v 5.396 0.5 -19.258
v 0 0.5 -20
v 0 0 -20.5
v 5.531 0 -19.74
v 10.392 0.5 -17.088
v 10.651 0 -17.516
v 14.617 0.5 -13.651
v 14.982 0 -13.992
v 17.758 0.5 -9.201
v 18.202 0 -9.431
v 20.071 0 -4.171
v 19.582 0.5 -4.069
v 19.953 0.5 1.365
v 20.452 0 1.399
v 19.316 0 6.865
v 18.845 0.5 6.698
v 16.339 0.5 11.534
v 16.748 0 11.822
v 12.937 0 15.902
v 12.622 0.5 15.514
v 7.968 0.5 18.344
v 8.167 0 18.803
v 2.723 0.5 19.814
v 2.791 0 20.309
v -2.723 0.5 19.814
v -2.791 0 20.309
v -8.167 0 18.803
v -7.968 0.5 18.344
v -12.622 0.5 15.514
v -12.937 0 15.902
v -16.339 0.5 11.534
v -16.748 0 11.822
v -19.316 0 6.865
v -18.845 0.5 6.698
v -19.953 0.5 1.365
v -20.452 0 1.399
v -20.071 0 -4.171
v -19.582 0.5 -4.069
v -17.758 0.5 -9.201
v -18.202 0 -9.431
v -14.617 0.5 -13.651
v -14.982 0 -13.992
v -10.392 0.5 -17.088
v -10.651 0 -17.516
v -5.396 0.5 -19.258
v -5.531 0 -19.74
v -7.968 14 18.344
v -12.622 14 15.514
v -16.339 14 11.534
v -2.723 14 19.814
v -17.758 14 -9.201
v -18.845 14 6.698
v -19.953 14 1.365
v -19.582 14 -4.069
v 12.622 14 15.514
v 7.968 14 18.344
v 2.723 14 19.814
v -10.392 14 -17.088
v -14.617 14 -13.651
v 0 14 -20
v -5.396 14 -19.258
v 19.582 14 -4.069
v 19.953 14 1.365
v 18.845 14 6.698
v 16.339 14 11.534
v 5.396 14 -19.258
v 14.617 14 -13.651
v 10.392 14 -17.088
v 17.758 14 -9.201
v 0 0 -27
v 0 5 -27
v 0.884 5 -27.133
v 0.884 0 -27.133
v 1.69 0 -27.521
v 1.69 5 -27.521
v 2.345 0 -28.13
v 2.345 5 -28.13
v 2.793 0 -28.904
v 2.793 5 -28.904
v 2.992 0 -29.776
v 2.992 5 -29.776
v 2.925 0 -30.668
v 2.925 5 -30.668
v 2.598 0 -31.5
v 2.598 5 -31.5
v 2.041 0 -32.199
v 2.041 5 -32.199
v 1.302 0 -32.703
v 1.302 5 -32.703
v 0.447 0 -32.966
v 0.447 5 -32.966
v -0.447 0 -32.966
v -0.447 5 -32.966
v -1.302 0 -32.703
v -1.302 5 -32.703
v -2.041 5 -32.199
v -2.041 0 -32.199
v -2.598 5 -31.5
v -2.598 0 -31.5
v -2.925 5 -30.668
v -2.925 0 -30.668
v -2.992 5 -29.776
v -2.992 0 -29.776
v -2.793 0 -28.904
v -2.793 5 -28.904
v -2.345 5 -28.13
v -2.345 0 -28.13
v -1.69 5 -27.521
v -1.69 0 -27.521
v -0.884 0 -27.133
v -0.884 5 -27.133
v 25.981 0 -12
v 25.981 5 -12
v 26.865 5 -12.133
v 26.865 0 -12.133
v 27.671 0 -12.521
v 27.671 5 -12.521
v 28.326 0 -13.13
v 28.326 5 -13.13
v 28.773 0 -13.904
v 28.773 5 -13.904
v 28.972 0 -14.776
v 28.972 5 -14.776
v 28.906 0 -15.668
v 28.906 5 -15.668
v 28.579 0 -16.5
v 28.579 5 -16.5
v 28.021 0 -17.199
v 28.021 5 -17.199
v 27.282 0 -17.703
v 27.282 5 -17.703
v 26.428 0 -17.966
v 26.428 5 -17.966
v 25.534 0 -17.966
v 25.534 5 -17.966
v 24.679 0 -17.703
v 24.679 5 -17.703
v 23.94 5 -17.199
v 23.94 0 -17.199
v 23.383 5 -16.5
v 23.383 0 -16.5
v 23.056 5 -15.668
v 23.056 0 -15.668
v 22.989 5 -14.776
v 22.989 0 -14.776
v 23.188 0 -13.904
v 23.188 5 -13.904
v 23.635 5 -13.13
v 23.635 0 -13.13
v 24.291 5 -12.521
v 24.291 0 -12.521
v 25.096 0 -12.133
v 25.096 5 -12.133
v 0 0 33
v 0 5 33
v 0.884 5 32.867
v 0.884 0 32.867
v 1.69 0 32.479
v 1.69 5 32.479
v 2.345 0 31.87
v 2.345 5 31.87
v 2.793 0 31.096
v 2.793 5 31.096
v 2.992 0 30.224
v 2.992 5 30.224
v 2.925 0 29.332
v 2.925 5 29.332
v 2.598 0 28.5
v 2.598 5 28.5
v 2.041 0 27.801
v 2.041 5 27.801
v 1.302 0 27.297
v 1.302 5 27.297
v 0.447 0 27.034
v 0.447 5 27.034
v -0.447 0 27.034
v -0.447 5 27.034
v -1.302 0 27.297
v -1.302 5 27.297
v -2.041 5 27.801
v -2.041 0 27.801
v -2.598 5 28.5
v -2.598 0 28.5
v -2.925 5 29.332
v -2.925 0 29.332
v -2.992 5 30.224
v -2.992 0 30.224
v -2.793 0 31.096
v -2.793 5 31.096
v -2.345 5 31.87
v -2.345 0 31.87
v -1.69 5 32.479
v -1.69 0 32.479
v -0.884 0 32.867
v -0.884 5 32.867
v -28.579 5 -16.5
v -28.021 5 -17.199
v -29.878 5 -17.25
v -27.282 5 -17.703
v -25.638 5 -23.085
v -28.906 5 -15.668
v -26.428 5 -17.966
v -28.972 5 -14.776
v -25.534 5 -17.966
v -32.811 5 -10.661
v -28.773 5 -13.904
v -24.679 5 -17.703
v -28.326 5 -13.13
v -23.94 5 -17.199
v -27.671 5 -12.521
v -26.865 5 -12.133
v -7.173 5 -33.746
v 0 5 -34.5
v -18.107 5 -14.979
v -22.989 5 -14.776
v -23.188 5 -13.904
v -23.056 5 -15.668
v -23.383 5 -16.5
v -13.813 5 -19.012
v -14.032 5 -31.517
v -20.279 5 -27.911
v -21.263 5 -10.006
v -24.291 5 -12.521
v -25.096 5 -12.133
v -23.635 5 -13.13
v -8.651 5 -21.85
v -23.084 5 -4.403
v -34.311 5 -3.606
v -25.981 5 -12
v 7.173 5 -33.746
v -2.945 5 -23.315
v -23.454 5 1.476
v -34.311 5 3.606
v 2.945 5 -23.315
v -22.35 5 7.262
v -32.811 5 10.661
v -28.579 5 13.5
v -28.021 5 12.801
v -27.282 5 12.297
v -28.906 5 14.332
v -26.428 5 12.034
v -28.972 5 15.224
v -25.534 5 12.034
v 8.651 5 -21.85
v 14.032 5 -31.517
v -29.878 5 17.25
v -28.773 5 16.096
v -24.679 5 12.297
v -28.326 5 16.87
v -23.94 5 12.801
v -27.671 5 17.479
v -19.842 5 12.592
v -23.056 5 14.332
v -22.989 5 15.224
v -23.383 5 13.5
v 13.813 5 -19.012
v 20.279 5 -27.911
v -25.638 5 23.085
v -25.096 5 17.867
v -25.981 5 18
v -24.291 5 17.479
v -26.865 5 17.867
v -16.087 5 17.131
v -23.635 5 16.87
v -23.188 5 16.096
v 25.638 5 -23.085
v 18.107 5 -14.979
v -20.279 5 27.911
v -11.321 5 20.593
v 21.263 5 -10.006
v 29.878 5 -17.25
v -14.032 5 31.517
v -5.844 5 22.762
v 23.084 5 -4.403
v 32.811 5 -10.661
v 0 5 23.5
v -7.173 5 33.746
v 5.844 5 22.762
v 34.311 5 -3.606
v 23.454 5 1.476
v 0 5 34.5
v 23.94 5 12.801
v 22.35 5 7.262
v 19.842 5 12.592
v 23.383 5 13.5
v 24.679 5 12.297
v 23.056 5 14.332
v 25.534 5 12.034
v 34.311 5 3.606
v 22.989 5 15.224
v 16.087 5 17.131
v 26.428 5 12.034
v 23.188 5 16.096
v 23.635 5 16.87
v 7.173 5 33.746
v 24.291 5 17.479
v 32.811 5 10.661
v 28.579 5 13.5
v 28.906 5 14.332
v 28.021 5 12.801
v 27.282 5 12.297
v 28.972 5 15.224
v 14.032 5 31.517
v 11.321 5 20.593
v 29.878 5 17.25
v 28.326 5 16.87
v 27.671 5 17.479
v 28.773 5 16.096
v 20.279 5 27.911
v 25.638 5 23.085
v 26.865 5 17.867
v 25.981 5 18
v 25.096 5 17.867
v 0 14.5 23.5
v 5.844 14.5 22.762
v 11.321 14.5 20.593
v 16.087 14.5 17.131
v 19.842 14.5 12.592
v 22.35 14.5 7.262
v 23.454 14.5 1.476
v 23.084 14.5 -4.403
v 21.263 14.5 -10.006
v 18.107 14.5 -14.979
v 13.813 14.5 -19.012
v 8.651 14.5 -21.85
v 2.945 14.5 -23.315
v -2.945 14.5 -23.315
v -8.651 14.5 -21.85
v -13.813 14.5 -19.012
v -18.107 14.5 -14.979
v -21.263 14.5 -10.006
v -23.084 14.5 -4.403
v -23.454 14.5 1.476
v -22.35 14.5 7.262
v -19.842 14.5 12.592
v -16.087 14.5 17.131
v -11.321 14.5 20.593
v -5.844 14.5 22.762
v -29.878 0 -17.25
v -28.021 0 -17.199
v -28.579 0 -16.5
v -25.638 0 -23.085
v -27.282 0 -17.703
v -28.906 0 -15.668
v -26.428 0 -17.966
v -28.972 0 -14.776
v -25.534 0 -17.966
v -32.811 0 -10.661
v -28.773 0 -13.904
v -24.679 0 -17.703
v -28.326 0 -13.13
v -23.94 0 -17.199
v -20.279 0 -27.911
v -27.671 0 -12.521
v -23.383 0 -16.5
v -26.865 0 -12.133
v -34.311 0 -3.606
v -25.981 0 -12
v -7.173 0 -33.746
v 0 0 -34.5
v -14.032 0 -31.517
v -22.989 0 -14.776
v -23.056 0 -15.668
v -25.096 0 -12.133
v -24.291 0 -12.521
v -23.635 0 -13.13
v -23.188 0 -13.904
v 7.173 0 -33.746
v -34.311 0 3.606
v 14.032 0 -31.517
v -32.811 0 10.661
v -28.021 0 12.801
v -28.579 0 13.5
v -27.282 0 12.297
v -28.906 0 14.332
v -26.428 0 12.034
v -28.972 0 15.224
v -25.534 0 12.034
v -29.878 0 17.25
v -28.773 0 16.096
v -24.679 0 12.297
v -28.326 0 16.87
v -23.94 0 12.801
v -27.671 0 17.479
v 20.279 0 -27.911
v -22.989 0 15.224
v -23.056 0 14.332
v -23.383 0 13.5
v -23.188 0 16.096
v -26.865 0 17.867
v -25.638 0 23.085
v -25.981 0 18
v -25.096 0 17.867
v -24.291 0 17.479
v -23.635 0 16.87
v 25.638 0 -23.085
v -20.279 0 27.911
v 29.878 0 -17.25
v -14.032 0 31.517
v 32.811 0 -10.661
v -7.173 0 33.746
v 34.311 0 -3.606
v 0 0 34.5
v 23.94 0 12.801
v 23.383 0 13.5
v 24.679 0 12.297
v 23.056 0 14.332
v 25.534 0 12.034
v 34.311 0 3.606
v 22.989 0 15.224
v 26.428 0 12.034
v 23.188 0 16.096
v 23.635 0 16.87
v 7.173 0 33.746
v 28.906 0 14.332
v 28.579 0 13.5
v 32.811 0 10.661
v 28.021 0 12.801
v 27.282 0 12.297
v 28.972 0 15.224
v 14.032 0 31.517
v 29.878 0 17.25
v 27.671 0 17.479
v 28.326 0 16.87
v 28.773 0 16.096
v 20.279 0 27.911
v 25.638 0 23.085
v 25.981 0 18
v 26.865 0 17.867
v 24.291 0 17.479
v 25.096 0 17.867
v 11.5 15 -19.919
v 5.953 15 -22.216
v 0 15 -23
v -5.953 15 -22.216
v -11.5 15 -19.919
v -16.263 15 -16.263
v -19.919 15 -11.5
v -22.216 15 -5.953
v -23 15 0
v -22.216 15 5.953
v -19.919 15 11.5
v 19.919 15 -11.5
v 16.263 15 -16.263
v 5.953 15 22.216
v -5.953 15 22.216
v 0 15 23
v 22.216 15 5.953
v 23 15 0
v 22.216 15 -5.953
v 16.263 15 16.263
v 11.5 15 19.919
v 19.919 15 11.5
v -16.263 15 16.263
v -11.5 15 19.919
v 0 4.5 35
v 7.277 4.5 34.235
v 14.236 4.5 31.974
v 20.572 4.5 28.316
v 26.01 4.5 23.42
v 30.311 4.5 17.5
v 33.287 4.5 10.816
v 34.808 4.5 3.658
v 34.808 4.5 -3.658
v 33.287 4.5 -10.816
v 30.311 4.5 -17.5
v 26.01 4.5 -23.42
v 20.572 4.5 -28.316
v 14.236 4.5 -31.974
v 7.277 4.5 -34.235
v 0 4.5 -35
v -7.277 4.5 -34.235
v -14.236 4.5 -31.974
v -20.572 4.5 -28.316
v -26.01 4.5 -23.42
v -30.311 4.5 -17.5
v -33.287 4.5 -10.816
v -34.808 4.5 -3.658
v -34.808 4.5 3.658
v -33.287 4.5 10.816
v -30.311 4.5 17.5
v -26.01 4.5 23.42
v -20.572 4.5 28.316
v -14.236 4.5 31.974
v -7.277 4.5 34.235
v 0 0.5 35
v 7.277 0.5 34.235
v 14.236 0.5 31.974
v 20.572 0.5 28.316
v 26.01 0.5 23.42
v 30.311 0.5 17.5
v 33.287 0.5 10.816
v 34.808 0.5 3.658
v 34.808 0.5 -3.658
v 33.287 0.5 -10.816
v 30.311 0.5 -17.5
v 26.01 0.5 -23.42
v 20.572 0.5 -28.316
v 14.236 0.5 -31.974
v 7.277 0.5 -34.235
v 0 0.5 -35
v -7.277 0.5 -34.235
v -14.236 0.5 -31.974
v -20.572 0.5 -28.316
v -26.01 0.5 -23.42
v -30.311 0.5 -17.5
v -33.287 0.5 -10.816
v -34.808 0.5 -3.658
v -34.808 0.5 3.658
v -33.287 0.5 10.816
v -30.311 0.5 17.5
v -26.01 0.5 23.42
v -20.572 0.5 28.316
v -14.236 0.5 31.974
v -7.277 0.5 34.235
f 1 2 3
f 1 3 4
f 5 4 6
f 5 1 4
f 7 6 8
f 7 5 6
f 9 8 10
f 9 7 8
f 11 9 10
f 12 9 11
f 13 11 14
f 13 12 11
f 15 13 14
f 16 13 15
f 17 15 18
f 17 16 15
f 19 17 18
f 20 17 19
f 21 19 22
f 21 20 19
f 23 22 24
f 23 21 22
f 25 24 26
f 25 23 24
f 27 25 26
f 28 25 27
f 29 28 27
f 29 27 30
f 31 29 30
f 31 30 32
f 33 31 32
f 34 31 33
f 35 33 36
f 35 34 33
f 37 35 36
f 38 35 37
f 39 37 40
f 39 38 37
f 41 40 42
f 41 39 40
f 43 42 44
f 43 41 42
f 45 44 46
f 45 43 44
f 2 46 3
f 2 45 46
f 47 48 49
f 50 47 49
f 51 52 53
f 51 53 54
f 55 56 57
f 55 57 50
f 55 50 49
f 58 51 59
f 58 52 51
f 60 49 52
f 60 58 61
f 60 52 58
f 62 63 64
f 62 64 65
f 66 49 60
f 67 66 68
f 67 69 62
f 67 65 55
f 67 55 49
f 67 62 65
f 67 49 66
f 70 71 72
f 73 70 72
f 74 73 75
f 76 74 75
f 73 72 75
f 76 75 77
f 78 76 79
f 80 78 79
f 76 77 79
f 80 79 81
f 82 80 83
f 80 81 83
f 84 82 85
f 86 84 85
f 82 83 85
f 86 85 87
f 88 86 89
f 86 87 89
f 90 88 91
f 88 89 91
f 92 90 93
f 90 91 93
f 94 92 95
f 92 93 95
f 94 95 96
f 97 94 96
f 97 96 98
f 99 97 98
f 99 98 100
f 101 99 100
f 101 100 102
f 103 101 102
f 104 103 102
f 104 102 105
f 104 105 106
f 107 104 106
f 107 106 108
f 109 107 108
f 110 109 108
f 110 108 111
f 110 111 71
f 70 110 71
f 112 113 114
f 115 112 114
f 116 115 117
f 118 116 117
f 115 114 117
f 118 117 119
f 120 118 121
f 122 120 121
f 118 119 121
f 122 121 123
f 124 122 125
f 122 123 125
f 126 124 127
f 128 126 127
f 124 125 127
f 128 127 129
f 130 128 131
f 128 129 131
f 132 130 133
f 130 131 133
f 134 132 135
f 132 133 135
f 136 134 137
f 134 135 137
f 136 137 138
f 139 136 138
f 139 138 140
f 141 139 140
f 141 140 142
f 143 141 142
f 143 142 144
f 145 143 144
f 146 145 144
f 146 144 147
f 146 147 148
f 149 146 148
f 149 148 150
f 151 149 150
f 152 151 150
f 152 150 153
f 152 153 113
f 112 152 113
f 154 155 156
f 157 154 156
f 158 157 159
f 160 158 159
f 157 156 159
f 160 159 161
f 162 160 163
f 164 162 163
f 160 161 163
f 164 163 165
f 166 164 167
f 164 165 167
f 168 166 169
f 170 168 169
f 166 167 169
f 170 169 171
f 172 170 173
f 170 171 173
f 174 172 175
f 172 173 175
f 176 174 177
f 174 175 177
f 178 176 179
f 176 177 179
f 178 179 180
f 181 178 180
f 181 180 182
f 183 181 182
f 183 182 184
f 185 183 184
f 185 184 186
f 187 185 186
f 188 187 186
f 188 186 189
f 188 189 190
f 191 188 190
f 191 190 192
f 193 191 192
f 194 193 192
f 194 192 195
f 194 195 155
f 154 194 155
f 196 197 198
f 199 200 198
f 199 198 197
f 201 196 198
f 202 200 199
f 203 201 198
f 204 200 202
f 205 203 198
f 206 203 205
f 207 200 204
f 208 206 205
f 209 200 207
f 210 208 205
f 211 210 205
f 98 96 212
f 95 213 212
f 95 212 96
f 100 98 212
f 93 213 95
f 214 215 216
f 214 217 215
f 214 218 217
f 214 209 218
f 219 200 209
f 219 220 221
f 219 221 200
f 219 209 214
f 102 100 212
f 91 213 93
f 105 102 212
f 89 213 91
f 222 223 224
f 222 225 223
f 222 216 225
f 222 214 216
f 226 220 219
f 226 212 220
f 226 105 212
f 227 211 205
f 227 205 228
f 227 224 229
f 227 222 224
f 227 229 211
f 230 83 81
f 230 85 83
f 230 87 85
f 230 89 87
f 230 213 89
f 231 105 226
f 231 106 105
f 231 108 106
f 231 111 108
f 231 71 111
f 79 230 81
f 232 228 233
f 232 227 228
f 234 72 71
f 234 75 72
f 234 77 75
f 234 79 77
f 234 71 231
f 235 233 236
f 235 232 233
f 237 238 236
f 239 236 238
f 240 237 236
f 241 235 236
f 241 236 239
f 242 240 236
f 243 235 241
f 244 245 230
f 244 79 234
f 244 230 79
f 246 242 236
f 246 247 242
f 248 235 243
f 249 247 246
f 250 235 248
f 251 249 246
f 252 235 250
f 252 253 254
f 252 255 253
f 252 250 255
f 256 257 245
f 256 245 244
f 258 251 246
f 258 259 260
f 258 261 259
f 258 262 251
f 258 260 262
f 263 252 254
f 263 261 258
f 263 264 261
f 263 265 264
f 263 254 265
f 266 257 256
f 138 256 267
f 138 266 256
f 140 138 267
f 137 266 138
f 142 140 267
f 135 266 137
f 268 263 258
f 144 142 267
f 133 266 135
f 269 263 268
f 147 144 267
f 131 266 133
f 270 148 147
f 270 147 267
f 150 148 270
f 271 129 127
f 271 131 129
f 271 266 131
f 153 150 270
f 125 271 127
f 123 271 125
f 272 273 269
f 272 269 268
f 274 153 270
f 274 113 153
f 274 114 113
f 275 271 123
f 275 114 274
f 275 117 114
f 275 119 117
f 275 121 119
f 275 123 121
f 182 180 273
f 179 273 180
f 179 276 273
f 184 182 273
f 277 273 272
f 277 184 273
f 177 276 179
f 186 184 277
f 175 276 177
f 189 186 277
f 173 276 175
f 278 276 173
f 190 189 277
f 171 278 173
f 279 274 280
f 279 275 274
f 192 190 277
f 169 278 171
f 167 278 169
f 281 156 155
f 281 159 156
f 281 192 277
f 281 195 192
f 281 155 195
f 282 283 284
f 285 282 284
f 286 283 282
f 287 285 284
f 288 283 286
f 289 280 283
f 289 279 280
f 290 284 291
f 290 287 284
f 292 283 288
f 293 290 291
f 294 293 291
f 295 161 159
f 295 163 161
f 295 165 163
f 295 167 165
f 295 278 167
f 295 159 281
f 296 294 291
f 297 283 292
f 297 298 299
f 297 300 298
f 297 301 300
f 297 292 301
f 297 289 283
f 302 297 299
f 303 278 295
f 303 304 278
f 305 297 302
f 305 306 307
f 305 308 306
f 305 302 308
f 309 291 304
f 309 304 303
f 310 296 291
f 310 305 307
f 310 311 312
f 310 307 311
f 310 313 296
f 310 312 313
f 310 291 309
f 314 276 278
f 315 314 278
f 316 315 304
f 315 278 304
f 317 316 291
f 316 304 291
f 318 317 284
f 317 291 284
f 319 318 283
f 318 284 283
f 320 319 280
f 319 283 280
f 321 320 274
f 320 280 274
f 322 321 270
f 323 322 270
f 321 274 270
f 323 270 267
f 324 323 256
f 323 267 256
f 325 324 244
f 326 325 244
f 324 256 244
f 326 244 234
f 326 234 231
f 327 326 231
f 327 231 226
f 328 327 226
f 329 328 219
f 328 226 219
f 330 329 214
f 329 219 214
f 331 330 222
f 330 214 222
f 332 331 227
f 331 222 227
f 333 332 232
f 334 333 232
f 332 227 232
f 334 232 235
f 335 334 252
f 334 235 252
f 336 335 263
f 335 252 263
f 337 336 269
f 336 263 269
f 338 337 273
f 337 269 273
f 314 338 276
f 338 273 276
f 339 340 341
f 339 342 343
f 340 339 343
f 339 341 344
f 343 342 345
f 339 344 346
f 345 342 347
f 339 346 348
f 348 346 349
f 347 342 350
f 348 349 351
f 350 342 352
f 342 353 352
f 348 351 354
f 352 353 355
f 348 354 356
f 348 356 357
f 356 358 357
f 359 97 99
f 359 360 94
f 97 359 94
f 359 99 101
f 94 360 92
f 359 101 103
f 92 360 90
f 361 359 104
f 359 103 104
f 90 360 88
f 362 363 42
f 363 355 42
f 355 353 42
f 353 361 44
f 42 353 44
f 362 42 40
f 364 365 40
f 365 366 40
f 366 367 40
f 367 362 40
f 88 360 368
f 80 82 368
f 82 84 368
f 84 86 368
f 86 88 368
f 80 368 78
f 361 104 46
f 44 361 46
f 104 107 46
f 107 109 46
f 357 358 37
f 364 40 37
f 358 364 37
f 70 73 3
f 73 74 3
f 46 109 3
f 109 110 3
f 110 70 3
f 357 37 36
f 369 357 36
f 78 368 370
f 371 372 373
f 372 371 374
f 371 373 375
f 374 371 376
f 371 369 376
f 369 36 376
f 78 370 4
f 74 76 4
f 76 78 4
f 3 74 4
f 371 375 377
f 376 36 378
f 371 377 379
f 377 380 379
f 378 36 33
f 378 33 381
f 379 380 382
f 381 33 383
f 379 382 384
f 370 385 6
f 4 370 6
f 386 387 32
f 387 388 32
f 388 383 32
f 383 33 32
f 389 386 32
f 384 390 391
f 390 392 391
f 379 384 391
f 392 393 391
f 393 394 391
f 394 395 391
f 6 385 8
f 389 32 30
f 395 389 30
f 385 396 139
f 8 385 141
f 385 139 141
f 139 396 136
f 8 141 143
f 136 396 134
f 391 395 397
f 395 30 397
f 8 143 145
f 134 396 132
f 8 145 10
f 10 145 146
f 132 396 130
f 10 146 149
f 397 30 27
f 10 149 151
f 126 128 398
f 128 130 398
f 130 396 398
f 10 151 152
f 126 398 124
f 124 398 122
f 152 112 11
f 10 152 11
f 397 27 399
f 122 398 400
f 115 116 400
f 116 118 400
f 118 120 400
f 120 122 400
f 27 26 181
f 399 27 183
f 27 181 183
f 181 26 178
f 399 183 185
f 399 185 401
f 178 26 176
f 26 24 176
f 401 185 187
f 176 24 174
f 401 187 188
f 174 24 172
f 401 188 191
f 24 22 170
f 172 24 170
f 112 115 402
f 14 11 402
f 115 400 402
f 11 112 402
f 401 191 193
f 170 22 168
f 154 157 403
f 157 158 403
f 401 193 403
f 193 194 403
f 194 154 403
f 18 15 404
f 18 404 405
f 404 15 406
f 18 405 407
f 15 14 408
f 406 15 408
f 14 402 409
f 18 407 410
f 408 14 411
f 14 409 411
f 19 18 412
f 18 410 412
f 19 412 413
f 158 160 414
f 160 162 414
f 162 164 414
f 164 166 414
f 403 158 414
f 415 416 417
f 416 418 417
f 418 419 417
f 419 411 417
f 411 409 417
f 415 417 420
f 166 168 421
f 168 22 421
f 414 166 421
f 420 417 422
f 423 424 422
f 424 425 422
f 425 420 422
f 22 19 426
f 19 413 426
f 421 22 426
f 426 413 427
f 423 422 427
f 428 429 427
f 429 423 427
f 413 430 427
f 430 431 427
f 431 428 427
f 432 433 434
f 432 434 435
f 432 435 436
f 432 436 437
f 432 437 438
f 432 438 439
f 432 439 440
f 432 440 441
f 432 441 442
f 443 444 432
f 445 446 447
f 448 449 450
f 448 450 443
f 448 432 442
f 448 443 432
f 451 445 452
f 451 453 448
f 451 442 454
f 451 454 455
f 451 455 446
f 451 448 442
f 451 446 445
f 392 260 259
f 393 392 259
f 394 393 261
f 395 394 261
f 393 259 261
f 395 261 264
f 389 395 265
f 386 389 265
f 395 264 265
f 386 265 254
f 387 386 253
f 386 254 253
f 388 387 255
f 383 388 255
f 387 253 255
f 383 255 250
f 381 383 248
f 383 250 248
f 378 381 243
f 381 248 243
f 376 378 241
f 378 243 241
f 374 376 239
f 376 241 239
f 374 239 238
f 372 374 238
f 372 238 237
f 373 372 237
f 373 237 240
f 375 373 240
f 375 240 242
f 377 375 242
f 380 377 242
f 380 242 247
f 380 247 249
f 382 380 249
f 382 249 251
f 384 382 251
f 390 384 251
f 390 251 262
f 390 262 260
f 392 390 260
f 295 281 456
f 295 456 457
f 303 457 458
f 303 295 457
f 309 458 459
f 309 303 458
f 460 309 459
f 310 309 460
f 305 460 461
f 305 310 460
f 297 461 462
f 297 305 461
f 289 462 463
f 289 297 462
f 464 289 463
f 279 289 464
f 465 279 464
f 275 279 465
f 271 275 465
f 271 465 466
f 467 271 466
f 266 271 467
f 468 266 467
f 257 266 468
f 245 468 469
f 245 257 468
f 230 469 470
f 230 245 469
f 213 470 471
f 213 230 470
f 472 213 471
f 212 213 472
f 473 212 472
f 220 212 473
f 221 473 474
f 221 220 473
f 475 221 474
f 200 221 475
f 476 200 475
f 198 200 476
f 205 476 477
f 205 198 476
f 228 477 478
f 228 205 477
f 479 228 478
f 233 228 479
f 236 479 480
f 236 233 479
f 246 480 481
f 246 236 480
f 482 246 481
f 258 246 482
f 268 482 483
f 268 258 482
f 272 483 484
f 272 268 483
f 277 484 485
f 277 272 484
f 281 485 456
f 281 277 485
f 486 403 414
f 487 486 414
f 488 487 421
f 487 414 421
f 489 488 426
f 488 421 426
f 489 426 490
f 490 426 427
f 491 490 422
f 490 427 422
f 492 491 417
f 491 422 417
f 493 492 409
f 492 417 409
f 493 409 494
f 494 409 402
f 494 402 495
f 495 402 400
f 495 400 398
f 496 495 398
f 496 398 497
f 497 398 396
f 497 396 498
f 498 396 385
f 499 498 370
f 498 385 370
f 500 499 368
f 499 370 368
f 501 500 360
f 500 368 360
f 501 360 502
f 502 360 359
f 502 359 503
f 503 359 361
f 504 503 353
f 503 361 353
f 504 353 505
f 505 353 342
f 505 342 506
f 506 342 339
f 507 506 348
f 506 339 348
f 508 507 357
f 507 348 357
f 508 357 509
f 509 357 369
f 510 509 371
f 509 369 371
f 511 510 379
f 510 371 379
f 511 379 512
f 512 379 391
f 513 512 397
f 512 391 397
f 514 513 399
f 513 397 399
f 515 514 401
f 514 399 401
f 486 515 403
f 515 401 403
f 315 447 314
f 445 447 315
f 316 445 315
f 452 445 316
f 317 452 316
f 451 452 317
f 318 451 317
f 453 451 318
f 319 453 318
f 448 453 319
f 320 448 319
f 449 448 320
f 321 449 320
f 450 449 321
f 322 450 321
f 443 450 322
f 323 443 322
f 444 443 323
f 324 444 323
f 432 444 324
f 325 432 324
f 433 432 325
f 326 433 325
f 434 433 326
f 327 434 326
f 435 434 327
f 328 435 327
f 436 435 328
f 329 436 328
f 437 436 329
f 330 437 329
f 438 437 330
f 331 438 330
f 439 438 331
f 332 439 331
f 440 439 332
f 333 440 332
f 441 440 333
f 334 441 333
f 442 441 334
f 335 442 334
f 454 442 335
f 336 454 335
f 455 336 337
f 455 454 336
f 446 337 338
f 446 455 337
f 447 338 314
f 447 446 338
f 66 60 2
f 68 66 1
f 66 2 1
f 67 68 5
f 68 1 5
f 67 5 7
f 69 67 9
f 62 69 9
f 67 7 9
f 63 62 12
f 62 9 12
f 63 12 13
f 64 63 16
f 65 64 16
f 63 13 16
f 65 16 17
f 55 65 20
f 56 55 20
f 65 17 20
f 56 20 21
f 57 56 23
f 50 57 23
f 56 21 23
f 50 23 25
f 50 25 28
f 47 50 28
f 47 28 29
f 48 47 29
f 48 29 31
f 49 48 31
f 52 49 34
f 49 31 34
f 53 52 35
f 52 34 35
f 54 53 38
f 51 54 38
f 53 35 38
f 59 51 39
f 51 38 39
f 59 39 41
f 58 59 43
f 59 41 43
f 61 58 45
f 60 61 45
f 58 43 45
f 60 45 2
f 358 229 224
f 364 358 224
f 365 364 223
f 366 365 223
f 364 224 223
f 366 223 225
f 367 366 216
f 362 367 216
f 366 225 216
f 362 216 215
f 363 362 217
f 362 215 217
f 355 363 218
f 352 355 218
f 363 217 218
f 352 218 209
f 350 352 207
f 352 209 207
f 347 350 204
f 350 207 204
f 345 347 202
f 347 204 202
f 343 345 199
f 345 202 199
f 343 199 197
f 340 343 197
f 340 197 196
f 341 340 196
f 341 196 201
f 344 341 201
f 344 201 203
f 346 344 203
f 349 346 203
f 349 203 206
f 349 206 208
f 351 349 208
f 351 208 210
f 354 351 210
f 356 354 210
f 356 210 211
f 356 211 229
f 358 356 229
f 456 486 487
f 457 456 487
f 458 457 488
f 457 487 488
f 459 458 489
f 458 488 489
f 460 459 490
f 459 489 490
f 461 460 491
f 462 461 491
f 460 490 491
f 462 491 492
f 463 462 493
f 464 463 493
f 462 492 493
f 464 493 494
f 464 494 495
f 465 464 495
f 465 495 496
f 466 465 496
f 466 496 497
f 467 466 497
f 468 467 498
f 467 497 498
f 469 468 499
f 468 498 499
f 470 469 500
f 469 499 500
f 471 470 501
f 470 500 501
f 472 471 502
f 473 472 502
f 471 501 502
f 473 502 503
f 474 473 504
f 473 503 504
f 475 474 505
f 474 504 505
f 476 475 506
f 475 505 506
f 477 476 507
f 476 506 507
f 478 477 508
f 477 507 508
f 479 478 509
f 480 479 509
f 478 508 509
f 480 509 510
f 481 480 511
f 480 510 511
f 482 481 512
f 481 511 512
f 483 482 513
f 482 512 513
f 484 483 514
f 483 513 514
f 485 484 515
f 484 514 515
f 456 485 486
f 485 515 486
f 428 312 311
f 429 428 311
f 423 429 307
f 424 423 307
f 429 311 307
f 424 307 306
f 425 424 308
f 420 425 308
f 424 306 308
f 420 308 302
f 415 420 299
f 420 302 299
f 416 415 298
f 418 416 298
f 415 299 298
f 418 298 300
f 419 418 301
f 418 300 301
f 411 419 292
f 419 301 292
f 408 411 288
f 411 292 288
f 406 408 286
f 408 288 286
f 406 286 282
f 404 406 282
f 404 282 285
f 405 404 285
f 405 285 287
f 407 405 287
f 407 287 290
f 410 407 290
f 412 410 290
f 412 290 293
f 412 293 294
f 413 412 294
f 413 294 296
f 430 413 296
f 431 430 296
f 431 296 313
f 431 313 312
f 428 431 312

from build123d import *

# Parameters (mm, degrees)
SKETCH_1_R          = 35
EXTRUDE_1_DEPTH     = 5
SKETCH_2_R          = 23.5
EXTRUDE_2_DEPTH     = 10
SKETCH_3_R          = 20
CUT_EXTRUDE_1_DEPTH = 14
SKETCH_4_R          = 3
CUT_EXTRUDE_2_DEPTH = 14
CHAMFER_1_SIZE      = 0.5


with BuildPart() as part:
    # 草图1 → 凸台-拉伸1 (new body)
    with BuildSketch(Plane(origin=(0, 0, 0), x_dir=(1, 0, 0), z_dir=(0, 1, 0))):
        with Locations(Location((0, 0, 0), (0, 0, 270))):
            Circle(SKETCH_1_R)
    extrude(amount=EXTRUDE_1_DEPTH)

    # 草图2 → 凸台-拉伸2 (add)
    with BuildSketch(Plane(origin=(0, 5, 0), x_dir=(1, 0, 0), z_dir=(0, 1, 0))):
        with Locations(Location((0, 0, 0), (0, 0, 270))):
            Circle(SKETCH_2_R)
    extrude(amount=EXTRUDE_2_DEPTH)

    # 草图3 → 切除-拉伸1 (cut)
    with BuildSketch(Plane.XZ):
        with Locations(Location((0, 0, 0), (0, 0, 270))):
            Circle(SKETCH_3_R)
    extrude(amount=-CUT_EXTRUDE_1_DEPTH, mode=Mode.SUBTRACT)

    # 草图4 → 切除-拉伸2 (cut)
    with BuildSketch(Plane(origin=(0, 5, 0), x_dir=(1, 0, 0), z_dir=(0, 1, 0))):
        with Locations(Location((0, 30, 0), (0, 0, 270))):
            Circle(SKETCH_4_R)
        with Locations(Location((25.980762114, 15, 0), (0, 0, 270))):
            Circle(SKETCH_4_R)
        with Locations(Location((25.980762114, -15, 0), (0, 0, 270))):
            Circle(SKETCH_4_R)
        with Locations(Location((0, -30, 0), (0, 0, 270))):
            Circle(SKETCH_4_R)
        with Locations(Location((-25.980762114, -15, 0), (0, 0, 270))):
            Circle(SKETCH_4_R)
        with Locations(Location((-25.980762114, 15, 0), (0, 0, 270))):
            Circle(SKETCH_4_R)
    extrude(amount=-CUT_EXTRUDE_2_DEPTH, mode=Mode.SUBTRACT)

    # Chamfer 1
    chamfer_1_edges = [part.edges().sort_by_distance(p)[0] for p in [
        (0, 0, 20),
        (0, 0, -35),
        (0, 5, -35),
        (0, 15, -23.5),
    ]]
    chamfer(chamfer_1_edges, length=CHAMFER_1_SIZE)


solid = part.part
